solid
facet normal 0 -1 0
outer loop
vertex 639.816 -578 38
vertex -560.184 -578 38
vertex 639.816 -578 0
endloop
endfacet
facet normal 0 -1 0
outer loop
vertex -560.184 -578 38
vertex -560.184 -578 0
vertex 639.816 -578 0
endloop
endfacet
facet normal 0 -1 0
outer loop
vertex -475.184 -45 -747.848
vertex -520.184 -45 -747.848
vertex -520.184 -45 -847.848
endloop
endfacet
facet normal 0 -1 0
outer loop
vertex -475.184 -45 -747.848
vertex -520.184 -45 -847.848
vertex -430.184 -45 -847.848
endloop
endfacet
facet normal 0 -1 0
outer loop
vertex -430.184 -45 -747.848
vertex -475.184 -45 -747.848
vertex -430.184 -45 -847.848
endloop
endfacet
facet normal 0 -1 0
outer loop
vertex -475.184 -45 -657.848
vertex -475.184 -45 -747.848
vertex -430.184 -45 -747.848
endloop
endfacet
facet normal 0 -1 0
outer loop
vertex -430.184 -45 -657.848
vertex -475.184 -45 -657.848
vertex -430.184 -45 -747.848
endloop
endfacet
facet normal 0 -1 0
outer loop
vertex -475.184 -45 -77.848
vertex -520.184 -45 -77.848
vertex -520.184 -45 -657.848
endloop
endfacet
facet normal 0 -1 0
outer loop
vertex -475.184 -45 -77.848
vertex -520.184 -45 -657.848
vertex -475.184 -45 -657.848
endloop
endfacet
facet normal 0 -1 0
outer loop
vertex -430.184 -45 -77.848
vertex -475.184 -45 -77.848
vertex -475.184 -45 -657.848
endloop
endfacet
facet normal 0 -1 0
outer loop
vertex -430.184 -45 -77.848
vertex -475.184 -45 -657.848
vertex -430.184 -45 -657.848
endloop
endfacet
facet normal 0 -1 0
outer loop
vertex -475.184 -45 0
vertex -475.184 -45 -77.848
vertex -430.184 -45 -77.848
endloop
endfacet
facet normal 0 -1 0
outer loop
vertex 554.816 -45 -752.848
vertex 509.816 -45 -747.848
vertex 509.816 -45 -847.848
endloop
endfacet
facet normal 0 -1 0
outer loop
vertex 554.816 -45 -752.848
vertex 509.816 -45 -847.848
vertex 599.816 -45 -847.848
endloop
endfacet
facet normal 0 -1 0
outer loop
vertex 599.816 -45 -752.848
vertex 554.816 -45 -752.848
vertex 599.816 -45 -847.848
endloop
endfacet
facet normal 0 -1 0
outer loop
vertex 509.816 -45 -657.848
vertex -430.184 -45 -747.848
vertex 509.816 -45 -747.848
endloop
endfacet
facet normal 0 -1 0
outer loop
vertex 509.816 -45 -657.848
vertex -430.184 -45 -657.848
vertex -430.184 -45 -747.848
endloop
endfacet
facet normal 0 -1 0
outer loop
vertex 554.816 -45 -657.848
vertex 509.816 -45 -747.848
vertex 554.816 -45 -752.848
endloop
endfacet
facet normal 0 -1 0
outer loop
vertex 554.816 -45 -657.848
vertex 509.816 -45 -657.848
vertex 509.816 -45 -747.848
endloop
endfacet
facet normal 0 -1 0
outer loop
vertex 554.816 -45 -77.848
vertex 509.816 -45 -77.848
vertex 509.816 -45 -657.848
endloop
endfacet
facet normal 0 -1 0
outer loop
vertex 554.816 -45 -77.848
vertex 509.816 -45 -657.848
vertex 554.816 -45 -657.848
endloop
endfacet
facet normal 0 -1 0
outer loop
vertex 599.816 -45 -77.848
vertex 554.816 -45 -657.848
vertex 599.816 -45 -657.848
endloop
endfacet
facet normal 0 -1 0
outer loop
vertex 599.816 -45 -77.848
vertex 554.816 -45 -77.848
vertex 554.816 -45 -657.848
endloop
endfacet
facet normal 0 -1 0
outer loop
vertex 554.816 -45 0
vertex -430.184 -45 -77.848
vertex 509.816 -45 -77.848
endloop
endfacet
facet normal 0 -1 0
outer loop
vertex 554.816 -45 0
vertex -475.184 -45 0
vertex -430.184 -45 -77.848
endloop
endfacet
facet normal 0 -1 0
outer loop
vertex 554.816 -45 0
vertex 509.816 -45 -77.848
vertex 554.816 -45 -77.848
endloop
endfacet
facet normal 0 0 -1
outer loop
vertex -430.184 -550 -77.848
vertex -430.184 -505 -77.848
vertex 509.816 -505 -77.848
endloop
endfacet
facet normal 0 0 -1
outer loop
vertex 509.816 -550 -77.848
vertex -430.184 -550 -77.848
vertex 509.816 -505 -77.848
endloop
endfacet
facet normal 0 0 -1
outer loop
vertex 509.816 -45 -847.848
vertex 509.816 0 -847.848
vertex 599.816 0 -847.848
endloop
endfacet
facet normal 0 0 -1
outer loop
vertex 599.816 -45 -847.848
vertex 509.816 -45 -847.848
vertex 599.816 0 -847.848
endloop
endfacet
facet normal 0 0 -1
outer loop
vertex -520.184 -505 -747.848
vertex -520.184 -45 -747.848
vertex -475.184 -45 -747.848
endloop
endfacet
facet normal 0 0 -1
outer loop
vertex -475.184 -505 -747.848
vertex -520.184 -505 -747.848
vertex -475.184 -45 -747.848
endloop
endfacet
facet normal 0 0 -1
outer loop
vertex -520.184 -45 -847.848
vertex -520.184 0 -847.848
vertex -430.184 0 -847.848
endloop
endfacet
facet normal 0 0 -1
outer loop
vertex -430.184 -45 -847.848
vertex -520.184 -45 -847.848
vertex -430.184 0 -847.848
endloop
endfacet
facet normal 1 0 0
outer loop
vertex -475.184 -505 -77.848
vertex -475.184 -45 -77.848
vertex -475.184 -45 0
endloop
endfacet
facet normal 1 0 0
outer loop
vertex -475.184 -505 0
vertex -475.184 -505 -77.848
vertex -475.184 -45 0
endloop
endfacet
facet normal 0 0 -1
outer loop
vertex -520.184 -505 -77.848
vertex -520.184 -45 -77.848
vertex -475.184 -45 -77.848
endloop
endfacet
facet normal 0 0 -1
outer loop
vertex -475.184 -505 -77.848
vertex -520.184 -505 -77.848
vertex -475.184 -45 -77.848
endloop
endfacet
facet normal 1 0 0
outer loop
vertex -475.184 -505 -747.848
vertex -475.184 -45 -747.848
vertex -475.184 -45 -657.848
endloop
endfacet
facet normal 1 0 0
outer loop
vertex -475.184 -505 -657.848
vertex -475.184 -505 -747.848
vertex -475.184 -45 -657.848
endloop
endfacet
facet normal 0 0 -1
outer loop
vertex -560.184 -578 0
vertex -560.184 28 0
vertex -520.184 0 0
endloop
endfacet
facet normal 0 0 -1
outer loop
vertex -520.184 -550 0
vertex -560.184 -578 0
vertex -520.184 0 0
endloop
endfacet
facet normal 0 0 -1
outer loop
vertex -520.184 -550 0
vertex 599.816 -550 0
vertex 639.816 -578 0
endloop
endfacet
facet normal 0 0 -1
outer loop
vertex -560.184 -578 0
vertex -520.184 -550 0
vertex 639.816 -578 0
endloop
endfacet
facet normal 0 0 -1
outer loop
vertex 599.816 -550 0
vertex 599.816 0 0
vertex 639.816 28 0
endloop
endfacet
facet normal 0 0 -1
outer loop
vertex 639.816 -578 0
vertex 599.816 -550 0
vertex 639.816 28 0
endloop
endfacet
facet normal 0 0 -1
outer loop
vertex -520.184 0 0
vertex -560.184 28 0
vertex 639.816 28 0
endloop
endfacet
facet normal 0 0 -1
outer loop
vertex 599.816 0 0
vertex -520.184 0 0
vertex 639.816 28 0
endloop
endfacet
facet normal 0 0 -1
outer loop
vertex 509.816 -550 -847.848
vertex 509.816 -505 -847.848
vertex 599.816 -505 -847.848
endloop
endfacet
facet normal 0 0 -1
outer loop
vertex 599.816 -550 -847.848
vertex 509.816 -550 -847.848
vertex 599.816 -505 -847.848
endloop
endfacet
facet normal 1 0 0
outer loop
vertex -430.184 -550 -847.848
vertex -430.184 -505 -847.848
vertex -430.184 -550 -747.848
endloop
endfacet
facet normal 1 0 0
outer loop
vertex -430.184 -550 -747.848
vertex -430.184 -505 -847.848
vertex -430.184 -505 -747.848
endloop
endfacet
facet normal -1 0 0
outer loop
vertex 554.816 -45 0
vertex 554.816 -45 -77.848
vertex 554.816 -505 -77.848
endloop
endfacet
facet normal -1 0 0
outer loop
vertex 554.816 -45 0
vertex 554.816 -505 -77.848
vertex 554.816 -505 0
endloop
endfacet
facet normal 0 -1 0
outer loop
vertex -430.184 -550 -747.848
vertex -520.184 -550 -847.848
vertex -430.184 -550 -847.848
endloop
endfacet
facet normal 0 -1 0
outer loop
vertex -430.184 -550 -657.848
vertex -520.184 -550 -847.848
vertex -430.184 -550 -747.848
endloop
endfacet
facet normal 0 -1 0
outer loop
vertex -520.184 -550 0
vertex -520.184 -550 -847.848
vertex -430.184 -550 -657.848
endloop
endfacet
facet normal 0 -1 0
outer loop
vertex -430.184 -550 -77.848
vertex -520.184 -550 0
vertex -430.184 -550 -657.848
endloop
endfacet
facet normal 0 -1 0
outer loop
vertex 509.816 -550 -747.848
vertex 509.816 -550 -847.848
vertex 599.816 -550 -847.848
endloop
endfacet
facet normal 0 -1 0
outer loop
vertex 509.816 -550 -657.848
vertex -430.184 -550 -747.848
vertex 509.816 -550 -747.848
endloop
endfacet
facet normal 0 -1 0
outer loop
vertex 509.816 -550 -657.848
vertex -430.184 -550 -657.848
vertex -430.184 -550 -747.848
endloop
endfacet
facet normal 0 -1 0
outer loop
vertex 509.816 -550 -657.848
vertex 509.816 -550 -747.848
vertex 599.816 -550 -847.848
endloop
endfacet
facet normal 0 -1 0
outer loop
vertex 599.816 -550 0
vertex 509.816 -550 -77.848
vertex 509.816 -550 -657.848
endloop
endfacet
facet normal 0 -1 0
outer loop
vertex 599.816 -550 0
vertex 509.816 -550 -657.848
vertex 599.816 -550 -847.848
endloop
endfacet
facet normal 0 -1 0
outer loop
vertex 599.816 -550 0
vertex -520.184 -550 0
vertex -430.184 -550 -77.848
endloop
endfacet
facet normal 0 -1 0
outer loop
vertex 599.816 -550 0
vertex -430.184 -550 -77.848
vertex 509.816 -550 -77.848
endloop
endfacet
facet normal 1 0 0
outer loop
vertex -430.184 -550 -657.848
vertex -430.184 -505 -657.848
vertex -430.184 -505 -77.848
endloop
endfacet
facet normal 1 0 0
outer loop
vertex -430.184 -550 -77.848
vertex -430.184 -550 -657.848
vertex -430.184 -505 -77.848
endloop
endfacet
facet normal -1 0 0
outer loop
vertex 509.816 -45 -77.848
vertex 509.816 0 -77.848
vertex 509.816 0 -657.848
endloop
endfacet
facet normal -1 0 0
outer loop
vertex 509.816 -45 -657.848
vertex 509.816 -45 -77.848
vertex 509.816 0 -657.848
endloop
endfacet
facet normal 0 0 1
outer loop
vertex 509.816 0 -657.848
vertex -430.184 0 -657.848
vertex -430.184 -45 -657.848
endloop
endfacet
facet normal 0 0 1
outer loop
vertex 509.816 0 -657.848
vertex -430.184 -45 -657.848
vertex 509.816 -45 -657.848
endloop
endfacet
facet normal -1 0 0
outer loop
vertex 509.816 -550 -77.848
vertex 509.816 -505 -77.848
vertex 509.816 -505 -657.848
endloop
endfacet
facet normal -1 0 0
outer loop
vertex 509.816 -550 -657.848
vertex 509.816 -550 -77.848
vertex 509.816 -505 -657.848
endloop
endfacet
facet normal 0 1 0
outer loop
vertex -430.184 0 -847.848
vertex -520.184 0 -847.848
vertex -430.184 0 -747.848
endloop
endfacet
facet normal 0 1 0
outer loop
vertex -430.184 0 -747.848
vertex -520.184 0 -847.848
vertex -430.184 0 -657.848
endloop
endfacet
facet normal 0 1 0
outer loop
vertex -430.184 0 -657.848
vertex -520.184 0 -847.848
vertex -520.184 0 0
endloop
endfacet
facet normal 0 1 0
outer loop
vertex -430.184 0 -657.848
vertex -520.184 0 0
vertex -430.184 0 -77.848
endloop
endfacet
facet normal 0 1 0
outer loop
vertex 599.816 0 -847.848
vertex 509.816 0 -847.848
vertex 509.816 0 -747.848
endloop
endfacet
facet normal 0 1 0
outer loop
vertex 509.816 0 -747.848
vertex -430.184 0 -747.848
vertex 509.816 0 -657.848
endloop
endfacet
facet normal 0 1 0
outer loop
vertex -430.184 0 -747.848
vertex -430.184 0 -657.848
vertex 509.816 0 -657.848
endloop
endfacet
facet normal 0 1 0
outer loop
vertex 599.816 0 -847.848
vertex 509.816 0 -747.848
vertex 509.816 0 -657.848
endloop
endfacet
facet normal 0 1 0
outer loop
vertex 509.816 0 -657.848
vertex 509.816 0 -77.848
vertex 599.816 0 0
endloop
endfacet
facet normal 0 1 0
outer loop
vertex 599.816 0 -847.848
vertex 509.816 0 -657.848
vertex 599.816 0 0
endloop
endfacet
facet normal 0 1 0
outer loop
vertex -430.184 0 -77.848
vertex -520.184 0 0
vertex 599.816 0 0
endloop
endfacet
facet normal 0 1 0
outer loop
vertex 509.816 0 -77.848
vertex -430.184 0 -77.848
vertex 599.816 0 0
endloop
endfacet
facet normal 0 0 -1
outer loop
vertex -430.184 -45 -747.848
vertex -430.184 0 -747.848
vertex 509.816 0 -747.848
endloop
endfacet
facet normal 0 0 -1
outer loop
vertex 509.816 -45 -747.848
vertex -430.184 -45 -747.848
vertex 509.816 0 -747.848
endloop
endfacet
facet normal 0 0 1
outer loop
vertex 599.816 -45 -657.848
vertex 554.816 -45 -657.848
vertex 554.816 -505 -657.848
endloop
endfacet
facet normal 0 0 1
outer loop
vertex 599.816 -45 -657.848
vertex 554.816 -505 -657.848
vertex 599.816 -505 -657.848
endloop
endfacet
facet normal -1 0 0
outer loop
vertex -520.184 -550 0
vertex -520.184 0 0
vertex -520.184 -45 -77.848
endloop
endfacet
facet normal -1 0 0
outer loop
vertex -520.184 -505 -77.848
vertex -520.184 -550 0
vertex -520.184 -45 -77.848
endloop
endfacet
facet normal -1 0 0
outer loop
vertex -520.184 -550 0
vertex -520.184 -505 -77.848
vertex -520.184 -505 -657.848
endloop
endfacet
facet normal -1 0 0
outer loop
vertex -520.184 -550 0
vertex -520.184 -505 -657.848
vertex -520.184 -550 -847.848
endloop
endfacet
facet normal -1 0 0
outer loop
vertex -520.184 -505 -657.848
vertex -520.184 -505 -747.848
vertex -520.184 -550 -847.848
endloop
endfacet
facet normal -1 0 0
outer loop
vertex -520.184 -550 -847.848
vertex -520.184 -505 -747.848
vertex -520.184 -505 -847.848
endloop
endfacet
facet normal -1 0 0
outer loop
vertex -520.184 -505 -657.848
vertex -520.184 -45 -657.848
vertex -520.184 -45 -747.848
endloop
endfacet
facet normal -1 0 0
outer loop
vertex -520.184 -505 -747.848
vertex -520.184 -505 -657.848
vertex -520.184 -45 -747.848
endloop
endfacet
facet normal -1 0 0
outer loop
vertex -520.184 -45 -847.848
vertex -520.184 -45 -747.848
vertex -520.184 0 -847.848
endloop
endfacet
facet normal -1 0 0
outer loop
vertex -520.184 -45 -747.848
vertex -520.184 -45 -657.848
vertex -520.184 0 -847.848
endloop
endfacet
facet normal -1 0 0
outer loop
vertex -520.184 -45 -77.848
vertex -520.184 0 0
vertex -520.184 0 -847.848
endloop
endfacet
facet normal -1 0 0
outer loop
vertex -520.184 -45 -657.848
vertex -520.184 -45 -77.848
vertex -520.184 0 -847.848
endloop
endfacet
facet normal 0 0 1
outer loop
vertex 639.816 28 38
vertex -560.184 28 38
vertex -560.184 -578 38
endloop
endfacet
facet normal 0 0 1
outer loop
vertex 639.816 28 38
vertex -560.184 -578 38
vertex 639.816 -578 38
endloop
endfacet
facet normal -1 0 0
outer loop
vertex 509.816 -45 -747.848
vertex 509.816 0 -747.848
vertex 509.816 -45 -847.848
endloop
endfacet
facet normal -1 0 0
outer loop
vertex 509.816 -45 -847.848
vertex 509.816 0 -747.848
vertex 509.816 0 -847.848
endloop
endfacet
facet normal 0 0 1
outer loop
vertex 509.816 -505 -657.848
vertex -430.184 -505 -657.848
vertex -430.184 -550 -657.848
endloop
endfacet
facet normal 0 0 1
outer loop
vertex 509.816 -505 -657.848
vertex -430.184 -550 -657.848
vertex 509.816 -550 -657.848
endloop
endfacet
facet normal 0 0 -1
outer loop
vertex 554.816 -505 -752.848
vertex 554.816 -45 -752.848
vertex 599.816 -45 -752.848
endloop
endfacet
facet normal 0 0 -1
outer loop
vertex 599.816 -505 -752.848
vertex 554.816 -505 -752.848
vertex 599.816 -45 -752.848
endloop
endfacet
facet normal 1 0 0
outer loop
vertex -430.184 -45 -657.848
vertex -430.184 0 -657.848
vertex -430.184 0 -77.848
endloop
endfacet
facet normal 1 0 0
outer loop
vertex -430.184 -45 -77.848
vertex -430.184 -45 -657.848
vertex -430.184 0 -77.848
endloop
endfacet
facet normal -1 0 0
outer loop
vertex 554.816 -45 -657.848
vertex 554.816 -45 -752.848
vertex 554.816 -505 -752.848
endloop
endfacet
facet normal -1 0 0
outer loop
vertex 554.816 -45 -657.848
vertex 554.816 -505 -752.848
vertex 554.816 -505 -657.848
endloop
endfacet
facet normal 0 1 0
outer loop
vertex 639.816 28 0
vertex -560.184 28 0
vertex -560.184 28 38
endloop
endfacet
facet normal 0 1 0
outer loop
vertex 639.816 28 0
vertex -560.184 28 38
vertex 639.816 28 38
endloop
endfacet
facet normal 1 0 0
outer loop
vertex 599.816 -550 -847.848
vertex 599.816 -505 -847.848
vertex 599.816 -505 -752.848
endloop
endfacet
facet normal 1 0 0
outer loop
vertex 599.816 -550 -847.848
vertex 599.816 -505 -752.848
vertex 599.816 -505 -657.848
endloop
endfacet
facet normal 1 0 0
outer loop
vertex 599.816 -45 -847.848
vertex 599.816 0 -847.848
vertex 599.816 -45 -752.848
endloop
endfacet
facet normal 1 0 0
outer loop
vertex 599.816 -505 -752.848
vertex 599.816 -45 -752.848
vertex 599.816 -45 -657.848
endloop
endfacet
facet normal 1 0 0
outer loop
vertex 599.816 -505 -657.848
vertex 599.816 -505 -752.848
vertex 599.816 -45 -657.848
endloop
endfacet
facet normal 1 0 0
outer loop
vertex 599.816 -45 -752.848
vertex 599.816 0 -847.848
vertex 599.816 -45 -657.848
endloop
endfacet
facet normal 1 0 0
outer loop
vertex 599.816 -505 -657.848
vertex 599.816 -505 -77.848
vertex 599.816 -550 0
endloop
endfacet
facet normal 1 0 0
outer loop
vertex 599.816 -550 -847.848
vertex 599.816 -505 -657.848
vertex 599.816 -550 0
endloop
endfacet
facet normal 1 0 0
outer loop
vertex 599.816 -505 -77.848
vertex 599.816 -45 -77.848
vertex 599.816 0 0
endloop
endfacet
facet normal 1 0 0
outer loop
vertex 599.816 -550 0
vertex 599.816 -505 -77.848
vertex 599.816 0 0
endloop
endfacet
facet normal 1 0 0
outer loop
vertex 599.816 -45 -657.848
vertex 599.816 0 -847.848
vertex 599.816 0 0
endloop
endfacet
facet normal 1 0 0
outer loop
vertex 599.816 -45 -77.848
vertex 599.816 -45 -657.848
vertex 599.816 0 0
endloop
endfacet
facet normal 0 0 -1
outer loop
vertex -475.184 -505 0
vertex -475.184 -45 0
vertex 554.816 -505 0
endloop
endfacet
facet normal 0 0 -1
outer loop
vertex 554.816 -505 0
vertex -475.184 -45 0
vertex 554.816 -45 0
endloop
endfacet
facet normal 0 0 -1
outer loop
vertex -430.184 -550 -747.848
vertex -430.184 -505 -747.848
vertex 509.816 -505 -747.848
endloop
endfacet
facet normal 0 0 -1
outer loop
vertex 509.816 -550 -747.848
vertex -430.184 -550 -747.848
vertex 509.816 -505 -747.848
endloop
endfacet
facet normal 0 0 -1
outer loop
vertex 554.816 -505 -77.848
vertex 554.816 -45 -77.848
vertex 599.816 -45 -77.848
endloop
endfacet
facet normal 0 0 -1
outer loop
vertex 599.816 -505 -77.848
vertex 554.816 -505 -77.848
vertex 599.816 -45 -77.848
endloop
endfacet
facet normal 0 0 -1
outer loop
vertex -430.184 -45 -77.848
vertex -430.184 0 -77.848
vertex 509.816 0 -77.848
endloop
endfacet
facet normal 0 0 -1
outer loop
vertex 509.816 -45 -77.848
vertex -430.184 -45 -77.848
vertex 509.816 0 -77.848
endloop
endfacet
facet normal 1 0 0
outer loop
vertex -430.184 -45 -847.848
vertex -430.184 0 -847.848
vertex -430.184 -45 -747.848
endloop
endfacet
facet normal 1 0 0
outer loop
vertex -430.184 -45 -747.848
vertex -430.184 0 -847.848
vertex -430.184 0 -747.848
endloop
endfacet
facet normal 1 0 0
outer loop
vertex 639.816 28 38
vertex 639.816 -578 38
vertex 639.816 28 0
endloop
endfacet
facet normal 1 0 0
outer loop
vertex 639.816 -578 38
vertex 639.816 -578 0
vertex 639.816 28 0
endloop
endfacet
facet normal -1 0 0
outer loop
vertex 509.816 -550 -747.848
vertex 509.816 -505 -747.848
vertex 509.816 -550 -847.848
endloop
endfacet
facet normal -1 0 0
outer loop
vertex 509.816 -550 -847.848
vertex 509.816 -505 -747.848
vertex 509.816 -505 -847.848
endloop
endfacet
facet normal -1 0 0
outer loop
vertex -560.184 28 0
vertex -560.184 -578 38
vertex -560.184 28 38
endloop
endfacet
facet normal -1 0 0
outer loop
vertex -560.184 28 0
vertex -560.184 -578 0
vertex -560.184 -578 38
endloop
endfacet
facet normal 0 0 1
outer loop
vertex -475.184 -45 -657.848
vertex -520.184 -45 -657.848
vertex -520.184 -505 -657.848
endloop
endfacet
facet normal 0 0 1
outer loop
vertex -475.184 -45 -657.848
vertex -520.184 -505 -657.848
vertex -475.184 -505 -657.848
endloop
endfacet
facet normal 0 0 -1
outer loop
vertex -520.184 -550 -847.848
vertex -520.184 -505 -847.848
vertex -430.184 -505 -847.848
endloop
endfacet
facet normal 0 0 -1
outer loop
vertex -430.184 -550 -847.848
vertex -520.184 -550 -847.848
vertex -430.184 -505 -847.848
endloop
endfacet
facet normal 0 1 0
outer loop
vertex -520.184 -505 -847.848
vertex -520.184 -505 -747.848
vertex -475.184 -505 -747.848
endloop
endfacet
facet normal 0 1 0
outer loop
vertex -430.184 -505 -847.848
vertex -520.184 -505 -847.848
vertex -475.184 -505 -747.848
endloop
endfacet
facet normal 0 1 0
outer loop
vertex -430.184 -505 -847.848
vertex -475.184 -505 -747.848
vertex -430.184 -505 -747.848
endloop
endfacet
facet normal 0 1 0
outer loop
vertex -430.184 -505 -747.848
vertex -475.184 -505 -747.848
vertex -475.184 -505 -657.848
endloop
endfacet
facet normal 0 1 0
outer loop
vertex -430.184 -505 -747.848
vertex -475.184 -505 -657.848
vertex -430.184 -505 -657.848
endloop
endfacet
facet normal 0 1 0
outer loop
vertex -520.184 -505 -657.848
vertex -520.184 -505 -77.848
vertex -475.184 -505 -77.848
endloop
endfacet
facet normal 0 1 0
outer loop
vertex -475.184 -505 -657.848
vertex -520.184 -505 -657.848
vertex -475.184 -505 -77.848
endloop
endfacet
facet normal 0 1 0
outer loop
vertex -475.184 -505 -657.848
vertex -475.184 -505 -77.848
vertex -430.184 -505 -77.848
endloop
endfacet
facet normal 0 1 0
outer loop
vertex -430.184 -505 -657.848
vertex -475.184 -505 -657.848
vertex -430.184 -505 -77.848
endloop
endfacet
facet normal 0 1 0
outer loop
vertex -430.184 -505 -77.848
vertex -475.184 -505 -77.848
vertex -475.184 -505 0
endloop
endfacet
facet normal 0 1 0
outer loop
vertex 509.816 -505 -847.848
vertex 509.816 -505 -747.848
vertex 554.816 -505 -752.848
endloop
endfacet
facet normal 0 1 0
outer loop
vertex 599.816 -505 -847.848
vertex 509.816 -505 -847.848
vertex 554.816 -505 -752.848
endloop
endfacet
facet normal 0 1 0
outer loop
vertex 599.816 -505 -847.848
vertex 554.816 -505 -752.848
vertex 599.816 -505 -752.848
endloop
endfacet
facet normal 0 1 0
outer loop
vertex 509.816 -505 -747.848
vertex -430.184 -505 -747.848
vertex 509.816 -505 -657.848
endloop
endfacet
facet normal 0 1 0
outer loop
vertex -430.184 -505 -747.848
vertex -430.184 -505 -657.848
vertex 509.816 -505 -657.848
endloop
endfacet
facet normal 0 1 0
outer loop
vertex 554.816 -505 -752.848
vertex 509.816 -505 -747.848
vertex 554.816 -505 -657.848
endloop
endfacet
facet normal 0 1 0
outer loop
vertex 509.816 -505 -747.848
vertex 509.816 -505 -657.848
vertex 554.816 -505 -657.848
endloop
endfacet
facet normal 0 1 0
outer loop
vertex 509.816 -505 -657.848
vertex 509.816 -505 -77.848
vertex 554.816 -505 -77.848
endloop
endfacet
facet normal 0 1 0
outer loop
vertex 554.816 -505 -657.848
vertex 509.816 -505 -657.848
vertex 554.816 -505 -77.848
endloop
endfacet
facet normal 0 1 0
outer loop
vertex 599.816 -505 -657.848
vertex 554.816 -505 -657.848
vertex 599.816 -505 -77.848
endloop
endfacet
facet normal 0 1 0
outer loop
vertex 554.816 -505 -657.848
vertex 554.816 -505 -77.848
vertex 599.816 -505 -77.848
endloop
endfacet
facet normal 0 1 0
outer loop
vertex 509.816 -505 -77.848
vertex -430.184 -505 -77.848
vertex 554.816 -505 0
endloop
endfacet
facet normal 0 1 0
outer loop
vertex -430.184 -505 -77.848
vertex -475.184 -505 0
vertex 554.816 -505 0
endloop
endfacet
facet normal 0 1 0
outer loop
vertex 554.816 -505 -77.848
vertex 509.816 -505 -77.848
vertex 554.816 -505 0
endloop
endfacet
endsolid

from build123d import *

# Parameters (mm, degrees)
F0_W      = 940
F0_H      = 90
F1_DEPTH  = 45
F3_W      = 45
F3_H      = 90
F3_H_2    = 95
F4_DEPTH  = 460
F6_W      = 940
F6_H      = 90
F7_DEPTH  = 45
F8_W      = 1200
F8_H      = 606
F9_DEPTH  = 19
F11_W     = 1200
F11_H     = 606
F12_DEPTH = 19


with BuildPart() as f1:
    # F0 (on Front) → F1 (new body)
    with BuildSketch(Plane.XZ):
        with Locations((39.816496, -32.848117)):
            Rectangle(F0_W, F0_H)
        Polygon((-430.183504, -77.848117), (-430.183504, 12.151883), (-520.183504, 12.151883), (-520.183504, -847.848117), (-430.183504, -847.848117), (-430.183504, -747.848117), (-430.183504, -657.848117), align=None)
        Polygon((599.816496, 12.151883), (509.816496, 12.151883), (509.816496, -77.848117), (509.816496, -657.848117), (509.816496, -747.848117), (509.816496, -847.848117), (599.816496, -847.848117), align=None)
        with Locations((39.816496, -702.848117)):
            Rectangle(F0_W, F0_H)
    extrude(amount=F1_DEPTH)

    # F3 (on offset) → F4 (join)
    with BuildSketch(Plane.XZ.offset(45)):
        with Locations((-497.683504, -32.848117)):
            Rectangle(F3_W, F3_H)
        with Locations((577.316496, -32.848117)):
            Rectangle(F3_W, F3_H)
        with Locations((577.316496, -705.348117)):
            Rectangle(F3_W, F3_H_2)
        with Locations((-497.683504, -702.848117)):
            Rectangle(F3_W, F3_H)
    extrude(amount=F4_DEPTH)

    # F6 (on offset) → F7 (join)
    with BuildSketch(Plane.XZ.offset(505)):
        with Locations((39.816496, -32.848117)):
            Rectangle(F6_W, F6_H)
        Polygon((-430.183504, -77.848117), (-430.183504, 12.151883), (-520.183504, 12.151883), (-520.183504, -847.848117), (-430.183504, -847.848117), (-430.183504, -747.848117), (-430.183504, -657.848117), align=None)
        Polygon((599.816496, 12.151883), (509.816496, 12.151883), (509.816496, -77.848117), (509.816496, -657.848117), (509.816496, -747.848117), (509.816496, -847.848117), (599.816496, -847.848117), align=None)
        with Locations((39.816496, -702.848117)):
            Rectangle(F6_W, F6_H)
    extrude(amount=F7_DEPTH)

    # F8 (on Top) → F9 (join)
    with BuildSketch(Plane.XY):
        with Locations((39.816496, -275)):
            Rectangle(F8_W, F8_H)
    extrude(amount=F9_DEPTH)

    # F11 (on offset) → F12 (join)
    with BuildSketch(Plane.XY.offset(19)):
        with Locations((39.816496, -275)):
            Rectangle(F11_W, F11_H)
    extrude(amount=F12_DEPTH)


solid = f1.part
